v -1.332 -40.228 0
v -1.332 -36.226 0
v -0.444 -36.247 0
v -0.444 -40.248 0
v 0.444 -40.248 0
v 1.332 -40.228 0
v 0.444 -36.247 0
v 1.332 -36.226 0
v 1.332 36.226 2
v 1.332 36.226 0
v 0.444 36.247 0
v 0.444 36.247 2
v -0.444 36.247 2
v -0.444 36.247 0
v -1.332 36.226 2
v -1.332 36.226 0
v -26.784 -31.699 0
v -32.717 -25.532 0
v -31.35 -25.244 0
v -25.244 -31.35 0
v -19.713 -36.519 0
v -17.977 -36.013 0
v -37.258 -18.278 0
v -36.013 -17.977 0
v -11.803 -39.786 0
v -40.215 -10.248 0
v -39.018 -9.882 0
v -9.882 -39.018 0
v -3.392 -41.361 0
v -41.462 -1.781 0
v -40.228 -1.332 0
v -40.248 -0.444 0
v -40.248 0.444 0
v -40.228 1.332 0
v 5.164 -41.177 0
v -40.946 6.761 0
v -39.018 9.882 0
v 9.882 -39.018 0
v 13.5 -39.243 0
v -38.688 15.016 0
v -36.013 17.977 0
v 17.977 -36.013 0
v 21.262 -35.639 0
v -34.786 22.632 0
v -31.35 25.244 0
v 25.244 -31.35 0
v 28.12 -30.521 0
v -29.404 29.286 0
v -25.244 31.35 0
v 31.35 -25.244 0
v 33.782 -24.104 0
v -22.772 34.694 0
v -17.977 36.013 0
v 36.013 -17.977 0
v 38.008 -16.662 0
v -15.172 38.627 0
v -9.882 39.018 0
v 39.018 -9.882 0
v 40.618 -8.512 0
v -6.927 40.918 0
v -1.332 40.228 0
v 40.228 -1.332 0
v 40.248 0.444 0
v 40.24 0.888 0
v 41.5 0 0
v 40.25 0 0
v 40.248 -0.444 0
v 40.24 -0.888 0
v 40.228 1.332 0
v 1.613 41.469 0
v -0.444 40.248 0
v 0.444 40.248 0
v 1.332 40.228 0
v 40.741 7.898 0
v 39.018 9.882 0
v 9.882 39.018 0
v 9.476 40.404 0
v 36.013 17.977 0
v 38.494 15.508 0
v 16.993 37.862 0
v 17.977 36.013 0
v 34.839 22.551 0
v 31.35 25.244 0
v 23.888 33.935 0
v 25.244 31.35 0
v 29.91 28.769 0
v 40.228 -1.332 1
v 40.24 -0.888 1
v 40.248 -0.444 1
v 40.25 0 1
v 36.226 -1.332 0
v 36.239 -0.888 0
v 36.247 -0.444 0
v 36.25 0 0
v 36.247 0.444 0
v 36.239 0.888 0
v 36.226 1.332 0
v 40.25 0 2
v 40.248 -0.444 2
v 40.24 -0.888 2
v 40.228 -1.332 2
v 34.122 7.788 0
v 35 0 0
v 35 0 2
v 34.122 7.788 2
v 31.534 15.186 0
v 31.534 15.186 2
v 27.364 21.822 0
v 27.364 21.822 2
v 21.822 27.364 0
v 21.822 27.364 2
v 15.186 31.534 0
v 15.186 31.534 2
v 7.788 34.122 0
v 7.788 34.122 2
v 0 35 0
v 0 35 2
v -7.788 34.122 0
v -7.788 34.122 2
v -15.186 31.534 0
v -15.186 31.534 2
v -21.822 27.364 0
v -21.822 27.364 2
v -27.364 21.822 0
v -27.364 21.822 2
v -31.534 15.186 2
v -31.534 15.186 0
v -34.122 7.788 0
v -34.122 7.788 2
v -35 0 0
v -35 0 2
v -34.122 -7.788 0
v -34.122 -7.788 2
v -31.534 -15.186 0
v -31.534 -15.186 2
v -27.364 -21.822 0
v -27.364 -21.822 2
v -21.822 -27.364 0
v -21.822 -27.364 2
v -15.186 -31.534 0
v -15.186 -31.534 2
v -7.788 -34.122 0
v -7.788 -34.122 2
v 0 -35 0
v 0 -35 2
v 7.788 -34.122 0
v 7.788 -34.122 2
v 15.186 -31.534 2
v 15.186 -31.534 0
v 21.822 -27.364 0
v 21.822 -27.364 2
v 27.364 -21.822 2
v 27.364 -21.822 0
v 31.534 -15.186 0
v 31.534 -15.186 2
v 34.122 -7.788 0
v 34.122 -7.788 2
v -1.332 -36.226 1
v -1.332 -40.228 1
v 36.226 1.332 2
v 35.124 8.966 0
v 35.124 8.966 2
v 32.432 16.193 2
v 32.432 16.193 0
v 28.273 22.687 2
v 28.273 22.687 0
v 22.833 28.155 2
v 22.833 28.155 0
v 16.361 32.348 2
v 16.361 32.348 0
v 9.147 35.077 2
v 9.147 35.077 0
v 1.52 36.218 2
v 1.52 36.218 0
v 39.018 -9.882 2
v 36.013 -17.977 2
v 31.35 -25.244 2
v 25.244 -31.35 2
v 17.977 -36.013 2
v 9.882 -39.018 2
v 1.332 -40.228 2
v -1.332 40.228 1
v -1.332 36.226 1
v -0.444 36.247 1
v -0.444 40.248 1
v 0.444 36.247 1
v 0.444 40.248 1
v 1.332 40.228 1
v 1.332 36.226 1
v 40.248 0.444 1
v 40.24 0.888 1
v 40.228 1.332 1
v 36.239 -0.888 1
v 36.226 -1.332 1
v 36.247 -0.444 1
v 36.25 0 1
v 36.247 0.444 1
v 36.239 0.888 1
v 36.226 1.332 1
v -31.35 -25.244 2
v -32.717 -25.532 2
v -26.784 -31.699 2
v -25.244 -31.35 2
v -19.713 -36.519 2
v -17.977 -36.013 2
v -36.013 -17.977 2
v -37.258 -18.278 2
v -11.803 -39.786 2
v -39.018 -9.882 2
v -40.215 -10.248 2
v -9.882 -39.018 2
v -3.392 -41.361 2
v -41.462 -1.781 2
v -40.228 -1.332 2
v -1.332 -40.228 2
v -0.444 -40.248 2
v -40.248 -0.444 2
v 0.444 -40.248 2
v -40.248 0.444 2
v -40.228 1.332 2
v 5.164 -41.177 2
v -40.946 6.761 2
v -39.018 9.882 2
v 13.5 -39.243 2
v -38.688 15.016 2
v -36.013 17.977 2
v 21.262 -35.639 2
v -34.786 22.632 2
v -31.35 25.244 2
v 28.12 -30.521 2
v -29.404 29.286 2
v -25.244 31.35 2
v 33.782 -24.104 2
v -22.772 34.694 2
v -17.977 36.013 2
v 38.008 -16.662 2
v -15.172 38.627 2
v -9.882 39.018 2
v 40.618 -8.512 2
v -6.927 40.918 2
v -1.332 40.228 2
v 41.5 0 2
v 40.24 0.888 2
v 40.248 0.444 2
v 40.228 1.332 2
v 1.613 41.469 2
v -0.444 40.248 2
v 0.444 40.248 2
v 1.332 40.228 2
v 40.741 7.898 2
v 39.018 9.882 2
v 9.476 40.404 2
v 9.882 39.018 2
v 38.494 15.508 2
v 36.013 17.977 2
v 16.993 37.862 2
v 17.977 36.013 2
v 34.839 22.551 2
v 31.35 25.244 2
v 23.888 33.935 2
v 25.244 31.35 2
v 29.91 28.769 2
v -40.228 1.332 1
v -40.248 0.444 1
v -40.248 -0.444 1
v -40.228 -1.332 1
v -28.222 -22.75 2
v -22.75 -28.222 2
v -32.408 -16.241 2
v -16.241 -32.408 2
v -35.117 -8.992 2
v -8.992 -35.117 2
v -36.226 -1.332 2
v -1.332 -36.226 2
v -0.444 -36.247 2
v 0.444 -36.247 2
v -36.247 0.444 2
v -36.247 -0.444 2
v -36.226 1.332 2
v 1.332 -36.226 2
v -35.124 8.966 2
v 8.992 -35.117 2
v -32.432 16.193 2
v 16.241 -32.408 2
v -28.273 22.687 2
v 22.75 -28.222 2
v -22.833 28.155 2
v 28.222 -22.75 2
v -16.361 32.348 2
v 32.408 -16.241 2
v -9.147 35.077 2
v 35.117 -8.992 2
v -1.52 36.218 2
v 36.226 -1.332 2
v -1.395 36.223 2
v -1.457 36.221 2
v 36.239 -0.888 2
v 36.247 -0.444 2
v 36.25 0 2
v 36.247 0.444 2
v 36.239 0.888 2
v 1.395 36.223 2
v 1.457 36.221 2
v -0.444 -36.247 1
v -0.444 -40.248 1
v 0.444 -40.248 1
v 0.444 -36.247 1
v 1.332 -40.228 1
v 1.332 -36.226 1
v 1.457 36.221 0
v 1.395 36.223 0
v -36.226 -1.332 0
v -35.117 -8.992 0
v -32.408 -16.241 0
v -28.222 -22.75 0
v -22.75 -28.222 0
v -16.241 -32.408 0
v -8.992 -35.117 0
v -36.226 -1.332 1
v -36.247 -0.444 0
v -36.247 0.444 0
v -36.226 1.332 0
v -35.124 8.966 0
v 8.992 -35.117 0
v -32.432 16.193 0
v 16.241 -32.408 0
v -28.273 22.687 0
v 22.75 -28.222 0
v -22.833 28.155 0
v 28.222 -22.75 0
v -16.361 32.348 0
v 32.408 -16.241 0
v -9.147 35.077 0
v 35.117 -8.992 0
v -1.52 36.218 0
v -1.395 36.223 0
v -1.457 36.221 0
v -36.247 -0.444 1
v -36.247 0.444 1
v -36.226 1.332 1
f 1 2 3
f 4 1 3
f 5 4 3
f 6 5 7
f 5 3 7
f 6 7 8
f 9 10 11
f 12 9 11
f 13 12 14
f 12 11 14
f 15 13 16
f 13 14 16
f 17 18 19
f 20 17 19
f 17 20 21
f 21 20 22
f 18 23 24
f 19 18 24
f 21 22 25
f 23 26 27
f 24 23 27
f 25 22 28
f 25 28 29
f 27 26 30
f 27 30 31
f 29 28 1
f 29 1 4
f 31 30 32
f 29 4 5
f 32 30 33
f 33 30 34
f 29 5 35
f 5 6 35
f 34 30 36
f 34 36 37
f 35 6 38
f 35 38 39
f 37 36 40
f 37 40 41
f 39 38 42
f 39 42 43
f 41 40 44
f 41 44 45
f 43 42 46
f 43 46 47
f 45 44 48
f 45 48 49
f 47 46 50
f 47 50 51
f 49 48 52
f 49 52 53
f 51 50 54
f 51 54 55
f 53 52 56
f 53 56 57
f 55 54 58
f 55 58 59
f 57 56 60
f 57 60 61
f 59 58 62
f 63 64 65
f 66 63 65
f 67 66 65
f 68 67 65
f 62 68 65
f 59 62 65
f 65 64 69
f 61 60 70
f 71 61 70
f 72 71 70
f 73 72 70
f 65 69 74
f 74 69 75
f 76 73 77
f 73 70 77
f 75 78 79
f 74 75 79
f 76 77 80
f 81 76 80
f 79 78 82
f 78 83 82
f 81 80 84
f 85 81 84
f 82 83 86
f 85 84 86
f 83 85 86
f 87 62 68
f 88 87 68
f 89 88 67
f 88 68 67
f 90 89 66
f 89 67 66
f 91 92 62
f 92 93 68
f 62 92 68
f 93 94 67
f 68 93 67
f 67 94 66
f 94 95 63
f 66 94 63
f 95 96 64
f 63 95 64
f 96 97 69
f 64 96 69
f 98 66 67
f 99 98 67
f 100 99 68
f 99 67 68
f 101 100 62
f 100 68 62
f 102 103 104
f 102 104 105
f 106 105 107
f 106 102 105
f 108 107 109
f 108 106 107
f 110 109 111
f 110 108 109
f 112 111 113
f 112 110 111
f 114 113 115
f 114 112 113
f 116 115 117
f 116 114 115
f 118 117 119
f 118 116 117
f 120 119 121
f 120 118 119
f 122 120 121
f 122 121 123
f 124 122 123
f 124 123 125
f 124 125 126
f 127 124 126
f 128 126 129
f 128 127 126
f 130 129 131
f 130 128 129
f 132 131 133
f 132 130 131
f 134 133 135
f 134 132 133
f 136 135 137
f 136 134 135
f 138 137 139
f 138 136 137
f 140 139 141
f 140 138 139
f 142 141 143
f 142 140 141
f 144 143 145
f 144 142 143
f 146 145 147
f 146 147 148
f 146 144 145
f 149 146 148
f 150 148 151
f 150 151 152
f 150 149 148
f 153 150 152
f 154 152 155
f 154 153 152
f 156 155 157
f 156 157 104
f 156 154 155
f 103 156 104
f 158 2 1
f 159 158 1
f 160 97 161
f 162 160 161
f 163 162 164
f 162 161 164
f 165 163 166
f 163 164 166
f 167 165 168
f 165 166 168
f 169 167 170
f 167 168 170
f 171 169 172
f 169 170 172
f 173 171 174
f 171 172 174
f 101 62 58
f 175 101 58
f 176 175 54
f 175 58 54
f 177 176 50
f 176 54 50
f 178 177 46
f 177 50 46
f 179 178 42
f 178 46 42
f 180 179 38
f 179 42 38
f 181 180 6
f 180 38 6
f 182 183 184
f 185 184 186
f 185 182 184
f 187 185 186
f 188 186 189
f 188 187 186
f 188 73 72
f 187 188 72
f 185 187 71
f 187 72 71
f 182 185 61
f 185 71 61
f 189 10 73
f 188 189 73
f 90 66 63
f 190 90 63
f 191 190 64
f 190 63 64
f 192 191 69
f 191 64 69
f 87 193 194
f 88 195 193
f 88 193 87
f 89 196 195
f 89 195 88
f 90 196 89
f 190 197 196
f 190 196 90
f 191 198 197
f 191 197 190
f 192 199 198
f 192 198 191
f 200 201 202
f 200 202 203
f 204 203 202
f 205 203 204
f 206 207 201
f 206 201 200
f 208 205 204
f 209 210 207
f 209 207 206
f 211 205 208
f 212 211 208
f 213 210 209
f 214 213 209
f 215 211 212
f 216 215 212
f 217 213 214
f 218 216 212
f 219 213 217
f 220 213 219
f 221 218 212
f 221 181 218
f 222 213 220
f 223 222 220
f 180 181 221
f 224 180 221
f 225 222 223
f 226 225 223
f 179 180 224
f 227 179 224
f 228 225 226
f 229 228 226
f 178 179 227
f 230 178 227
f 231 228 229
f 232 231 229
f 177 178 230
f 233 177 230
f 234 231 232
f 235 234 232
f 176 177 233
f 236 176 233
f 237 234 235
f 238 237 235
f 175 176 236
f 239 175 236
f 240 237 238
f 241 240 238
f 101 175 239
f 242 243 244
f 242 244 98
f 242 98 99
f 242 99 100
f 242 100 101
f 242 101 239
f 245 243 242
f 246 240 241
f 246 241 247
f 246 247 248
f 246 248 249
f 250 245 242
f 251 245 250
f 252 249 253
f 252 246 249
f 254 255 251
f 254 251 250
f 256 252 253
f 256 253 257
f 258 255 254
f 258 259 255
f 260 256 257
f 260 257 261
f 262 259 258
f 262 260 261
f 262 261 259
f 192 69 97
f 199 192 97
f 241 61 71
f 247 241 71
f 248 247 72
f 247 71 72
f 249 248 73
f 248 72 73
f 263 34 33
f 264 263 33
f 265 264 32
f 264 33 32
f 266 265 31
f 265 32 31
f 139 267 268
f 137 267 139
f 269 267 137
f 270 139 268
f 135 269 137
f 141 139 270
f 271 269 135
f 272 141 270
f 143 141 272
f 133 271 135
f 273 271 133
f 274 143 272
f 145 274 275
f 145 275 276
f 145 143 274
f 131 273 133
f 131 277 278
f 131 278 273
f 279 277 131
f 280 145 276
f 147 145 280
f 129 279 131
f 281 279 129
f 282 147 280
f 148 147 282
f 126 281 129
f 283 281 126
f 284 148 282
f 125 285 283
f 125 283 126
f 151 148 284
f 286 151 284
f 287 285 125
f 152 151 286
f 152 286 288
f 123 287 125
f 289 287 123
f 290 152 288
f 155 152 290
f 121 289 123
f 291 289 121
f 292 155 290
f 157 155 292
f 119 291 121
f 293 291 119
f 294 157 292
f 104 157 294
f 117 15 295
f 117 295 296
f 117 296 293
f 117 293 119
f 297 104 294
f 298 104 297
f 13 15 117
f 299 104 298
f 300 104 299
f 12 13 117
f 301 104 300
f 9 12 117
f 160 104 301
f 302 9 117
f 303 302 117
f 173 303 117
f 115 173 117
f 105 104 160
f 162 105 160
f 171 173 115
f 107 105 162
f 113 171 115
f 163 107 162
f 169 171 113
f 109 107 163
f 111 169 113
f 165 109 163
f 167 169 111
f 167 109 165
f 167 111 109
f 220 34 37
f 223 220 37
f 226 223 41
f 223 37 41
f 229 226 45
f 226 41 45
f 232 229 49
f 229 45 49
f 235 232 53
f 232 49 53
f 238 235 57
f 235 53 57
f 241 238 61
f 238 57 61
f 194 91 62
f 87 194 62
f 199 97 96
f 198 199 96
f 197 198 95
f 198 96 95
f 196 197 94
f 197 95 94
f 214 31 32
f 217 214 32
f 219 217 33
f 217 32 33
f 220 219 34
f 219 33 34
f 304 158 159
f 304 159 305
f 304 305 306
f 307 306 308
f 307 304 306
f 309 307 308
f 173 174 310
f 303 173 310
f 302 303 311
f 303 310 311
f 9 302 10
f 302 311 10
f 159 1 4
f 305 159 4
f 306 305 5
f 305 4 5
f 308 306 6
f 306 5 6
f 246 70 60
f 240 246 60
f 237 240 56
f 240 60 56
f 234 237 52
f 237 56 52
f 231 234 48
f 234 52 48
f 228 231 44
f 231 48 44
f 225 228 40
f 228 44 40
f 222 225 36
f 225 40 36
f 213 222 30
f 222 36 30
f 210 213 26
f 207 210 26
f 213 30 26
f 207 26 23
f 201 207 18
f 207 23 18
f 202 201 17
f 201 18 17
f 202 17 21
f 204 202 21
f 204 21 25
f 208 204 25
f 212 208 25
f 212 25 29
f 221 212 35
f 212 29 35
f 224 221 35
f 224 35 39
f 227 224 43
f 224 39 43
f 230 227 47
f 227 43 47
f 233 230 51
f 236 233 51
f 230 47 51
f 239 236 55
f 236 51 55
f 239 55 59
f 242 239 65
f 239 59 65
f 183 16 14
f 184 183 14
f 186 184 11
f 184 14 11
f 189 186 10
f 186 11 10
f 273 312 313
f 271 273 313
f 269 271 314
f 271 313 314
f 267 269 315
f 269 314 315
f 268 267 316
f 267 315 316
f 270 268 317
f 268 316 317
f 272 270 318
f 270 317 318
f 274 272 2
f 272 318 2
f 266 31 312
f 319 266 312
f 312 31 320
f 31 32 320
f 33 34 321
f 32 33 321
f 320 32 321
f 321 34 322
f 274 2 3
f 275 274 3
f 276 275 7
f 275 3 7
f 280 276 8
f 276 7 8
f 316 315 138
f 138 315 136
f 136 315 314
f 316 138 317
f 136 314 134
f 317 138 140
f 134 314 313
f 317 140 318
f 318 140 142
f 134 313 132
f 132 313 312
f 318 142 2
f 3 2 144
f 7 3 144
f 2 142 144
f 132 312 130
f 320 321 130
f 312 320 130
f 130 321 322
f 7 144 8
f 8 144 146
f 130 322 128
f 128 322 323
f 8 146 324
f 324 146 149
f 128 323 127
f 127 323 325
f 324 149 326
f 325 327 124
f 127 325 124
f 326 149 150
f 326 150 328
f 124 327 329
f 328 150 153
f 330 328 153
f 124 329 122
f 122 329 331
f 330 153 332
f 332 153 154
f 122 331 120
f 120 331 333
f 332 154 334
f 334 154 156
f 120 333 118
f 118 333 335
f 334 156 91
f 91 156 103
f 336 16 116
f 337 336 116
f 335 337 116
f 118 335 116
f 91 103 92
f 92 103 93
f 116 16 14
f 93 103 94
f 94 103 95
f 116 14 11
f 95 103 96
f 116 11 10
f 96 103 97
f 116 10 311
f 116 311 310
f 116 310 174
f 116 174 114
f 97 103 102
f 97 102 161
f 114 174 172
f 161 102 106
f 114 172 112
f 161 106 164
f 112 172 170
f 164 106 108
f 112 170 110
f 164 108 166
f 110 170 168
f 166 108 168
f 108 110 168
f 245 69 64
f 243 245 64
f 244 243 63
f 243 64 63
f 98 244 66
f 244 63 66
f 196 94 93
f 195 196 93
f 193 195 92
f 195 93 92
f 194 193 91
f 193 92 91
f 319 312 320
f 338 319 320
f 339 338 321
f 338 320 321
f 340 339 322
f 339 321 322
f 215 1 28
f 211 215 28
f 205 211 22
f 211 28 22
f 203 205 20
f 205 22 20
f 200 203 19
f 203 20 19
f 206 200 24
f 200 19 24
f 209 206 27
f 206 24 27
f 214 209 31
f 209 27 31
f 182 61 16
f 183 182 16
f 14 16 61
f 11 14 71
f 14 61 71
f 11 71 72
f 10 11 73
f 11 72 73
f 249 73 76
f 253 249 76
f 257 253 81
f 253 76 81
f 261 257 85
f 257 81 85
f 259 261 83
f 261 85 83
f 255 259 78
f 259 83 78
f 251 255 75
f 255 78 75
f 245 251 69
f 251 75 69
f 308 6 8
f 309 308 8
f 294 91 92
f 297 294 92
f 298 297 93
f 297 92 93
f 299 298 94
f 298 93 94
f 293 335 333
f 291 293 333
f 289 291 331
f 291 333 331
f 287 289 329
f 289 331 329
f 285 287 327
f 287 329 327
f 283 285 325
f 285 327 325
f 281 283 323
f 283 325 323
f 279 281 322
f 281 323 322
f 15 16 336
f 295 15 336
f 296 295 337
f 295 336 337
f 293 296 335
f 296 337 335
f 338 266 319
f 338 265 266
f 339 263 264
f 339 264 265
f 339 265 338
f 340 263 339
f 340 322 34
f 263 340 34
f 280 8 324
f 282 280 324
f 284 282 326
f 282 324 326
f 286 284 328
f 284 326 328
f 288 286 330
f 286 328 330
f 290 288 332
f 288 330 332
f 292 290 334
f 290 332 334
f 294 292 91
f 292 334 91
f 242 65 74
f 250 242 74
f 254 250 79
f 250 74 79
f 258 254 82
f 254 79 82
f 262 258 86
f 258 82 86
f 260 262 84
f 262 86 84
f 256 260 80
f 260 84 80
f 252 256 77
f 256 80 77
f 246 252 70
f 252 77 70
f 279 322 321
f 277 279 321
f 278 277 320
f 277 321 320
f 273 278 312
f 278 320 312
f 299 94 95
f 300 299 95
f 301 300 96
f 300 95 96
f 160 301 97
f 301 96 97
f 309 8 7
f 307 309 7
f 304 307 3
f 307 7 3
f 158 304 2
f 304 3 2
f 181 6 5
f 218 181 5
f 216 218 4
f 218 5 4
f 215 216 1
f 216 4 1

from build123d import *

# Parameters (mm, degrees)
F1_DEPTH = 2
F0_R     = 35
F0_W     = 2.6646726765
F0_H     = 1.0178747537
F2_DEPTH = 1


with BuildPart() as f1:
    # F0 (on Top) → F1 (new body)
    with BuildSketch(Plane.XY):
        with BuildLine():
            ThreePointArc((1.6134383026, 41.468624487), (-29.9099288662, -28.7688400048), (41.5, 0))
            ThreePointArc((41.5, 0), (29.9099288662, 28.7688400048), (1.6134383026, 41.468624487))
        make_face()
        with BuildLine():
            ThreePointArc((1.3323363382, 40.2279427747), (28.4610479428, 28.4610479428), (40.2279427747, 1.3323363382))
            Line((40.2279427747, 1.3323363382), (40.8782474697, 1.3323363382))
            Line((40.8782474697, 1.3323363382), (40.8782474697, -1.3323363382))
            Line((40.8782474697, -1.3323363382), (40.2279427747, -1.3323363382))
            ThreePointArc((40.2279427747, -1.3323363382), (28.4610479428, -28.4610479428), (1.3323363382, -40.2279427747))
            Line((1.3323363382, -40.2279427747), (1.3323363382, -40.8782474697))
            Line((1.3323363382, -40.8782474697), (-1.3323363382, -40.8782474697))
            Line((-1.3323363382, -40.8782474697), (-1.3323363382, -40.2279427747))
            ThreePointArc((-1.3323363382, -40.2279427747), (-28.4610479428, -28.4610479428), (-40.2279427747, -1.3323363382))
            Line((-40.2279427747, -1.3323363382), (-40.8782474697, -1.3323363382))
            Line((-40.8782474697, -1.3323363382), (-40.8782474697, 1.3323363382))
            Line((-40.8782474697, 1.3323363382), (-40.2279427747, 1.3323363382))
            ThreePointArc((-40.2279427747, 1.3323363382), (-28.4610479428, 28.4610479428), (-1.3323363382, 40.2279427747))
            Line((-1.3323363382, 40.2279427747), (-1.3323363382, 40.8782474697))
            Line((-1.3323363382, 40.8782474697), (1.3323363382, 40.8782474697))
            Line((1.3323363382, 40.8782474697), (1.3323363382, 40.2279427747))
        make_face(mode=Mode.SUBTRACT)
        with BuildLine():
            ThreePointArc((-40.2279427747, -1.3323363382), (-40.25, 0), (-40.2279427747, 1.3323363382))
            Line((-40.2279427747, 1.3323363382), (-40.8782474697, 1.3323363382))
            Line((-40.8782474697, 1.3323363382), (-40.8782474697, -1.3323363382))
            Line((-40.8782474697, -1.3323363382), (-40.2279427747, -1.3323363382))
        make_face()
        with BuildLine():
            ThreePointArc((-1.3323363382, 40.2279427747), (0, 40.25), (1.3323363382, 40.2279427747))
            Line((1.3323363382, 40.2279427747), (1.3323363382, 40.8782474697))
            Line((1.3323363382, 40.8782474697), (-1.3323363382, 40.8782474697))
            Line((-1.3323363382, 40.8782474697), (-1.3323363382, 40.2279427747))
        make_face()
        with BuildLine():
            Line((1.3323363382, -40.8782474697), (1.3323363382, -40.2279427747))
            ThreePointArc((1.3323363382, -40.2279427747), (0, -40.25), (-1.3323363382, -40.2279427747))
            Line((-1.3323363382, -40.2279427747), (-1.3323363382, -40.8782474697))
            Line((-1.3323363382, -40.8782474697), (1.3323363382, -40.8782474697))
        make_face()
        with BuildLine():
            Line((40.8782474697, 1.3323363382), (40.2279427747, 1.3323363382))
            ThreePointArc((40.2279427747, 1.3323363382), (40.2444853159, 0.6662594538), (40.25, 0))
            ThreePointArc((40.25, 0), (40.2444853159, -0.6662594538), (40.2279427747, -1.3323363382))
            Line((40.2279427747, -1.3323363382), (40.8782474697, -1.3323363382))
            Line((40.8782474697, -1.3323363382), (40.8782474697, 1.3323363382))
        make_face()
    extrude(amount=F1_DEPTH)


with BuildPart() as f1b:
    # F0 (on Top) → F1, piece 2 (new body)
    with BuildSketch(Plane.XY):
        with BuildLine():
            Line((35.2002568543, 1.3323363382), (36.2255073102, 1.3323363382))
            ThreePointArc((36.2255073102, 1.3323363382), (25.6988242062, 25.5662459978), (1.5196851084, 36.218131608))
            Line((1.5196851084, 36.218131608), (1.3323363382, 36.218131608))
            Line((1.3323363382, 36.218131608), (1.3323363382, 35.2002568543))
            Line((1.3323363382, 35.2002568543), (-1.3323363382, 35.2002568543))
            Line((-1.3323363382, 35.2002568543), (-1.3323363382, 36.218131608))
            Line((-1.3323363382, 36.218131608), (-1.5196851084, 36.218131608))
            ThreePointArc((-1.5196851084, 36.218131608), (-25.6988242062, 25.5662459978), (-36.2255073102, 1.3323363382))
            Line((-36.2255073102, 1.3323363382), (-35.2002568543, 1.3323363382))
            Line((-35.2002568543, 1.3323363382), (-35.2002568543, -1.3323363382))
            Line((-35.2002568543, -1.3323363382), (-36.2255073102, -1.3323363382))
            ThreePointArc((-36.2255073102, -1.3323363382), (-25.632620818, -25.632620818), (-1.3323363382, -36.2255073102))
            Line((-1.3323363382, -36.2255073102), (-1.3323363382, -35.2002568543))
            Line((-1.3323363382, -35.2002568543), (1.3323363382, -35.2002568543))
            Line((1.3323363382, -35.2002568543), (1.3323363382, -36.2255073102))
            ThreePointArc((1.3323363382, -36.2255073102), (25.632620818, -25.632620818), (36.2255073102, -1.3323363382))
            Line((36.2255073102, -1.3323363382), (35.2002568543, -1.3323363382))
            Line((35.2002568543, -1.3323363382), (35.2002568543, 1.3323363382))
        make_face()
        Circle(F0_R, mode=Mode.SUBTRACT)
        with BuildLine():
            ThreePointArc((36.2255073102, -1.3323363382), (36.2438763103, -0.6662807235), (36.25, 0))
            ThreePointArc((36.25, 0), (36.2438763103, 0.6662807235), (36.2255073102, 1.3323363382))
            Line((36.2255073102, 1.3323363382), (35.2002568543, 1.3323363382))
            Line((35.2002568543, 1.3323363382), (35.2002568543, -1.3323363382))
            Line((35.2002568543, -1.3323363382), (36.2255073102, -1.3323363382))
        make_face()
        with BuildLine():
            ThreePointArc((-36.2255073102, 1.3323363382), (-36.25, 0), (-36.2255073102, -1.3323363382))
            Line((-36.2255073102, -1.3323363382), (-35.2002568543, -1.3323363382))
            Line((-35.2002568543, -1.3323363382), (-35.2002568543, 1.3323363382))
            Line((-35.2002568543, 1.3323363382), (-36.2255073102, 1.3323363382))
        make_face()
        with BuildLine():
            ThreePointArc((-1.3323363382, -36.2255073102), (0, -36.25), (1.3323363382, -36.2255073102))
            Line((1.3323363382, -36.2255073102), (1.3323363382, -35.2002568543))
            Line((1.3323363382, -35.2002568543), (-1.3323363382, -35.2002568543))
            Line((-1.3323363382, -35.2002568543), (-1.3323363382, -36.2255073102))
        make_face()
        with Locations((0, 35.7091942311)):
            Rectangle(F0_W, F0_H)
        with BuildLine():
            Line((1.3323363382, 36.218131608), (1.3323363382, 36.2255073102))
            ThreePointArc((1.3323363382, 36.2255073102), (0, 36.25), (-1.3323363382, 36.2255073102))
            Line((-1.3323363382, 36.2255073102), (-1.3323363382, 36.218131608))
            Line((-1.3323363382, 36.218131608), (1.3323363382, 36.218131608))
        make_face()
        with BuildLine():
            Line((-1.3323363382, 36.218131608), (-1.3323363382, 36.2255073102))
            ThreePointArc((-1.3323363382, 36.2255073102), (-1.426015492, 36.221940586), (-1.5196851084, 36.218131608))
            Line((-1.5196851084, 36.218131608), (-1.3323363382, 36.218131608))
        make_face()
        with BuildLine():
            Line((1.3323363382, 36.218131608), (1.5196851084, 36.218131608))
            ThreePointArc((1.5196851084, 36.218131608), (1.426015492, 36.221940586), (1.3323363382, 36.2255073102))
            Line((1.3323363382, 36.2255073102), (1.3323363382, 36.218131608))
        make_face()
    extrude(amount=F1_DEPTH)


with BuildPart() as f2:
    # F0 (on Top) → F2 (new body)
    with BuildSketch(Plane.XY):
        with BuildLine():
            ThreePointArc((-1.3323363382, 36.2255073102), (0, 36.25), (1.3323363382, 36.2255073102))
            Line((1.3323363382, 36.2255073102), (1.3323363382, 40.2279427747))
            ThreePointArc((1.3323363382, 40.2279427747), (0, 40.25), (-1.3323363382, 40.2279427747))
            Line((-1.3323363382, 40.2279427747), (-1.3323363382, 36.2255073102))
        make_face()
    extrude(amount=F2_DEPTH)


with BuildPart() as f2b:
    # F0 (on Top) → F2, piece 2 (new body)
    with BuildSketch(Plane.XY):
        with BuildLine():
            ThreePointArc((36.2255073102, 1.3323363382), (36.2438763103, 0.6662807235), (36.25, 0))
            ThreePointArc((36.25, 0), (36.2438763103, -0.6662807235), (36.2255073102, -1.3323363382))
            Line((36.2255073102, -1.3323363382), (40.2279427747, -1.3323363382))
            ThreePointArc((40.2279427747, -1.3323363382), (40.2444853159, -0.6662594538), (40.25, 0))
            ThreePointArc((40.25, 0), (40.2444853159, 0.6662594538), (40.2279427747, 1.3323363382))
            Line((40.2279427747, 1.3323363382), (36.2255073102, 1.3323363382))
        make_face()
    extrude(amount=F2_DEPTH)


with BuildPart() as f2c:
    # F0 (on Top) → F2, piece 3 (new body)
    with BuildSketch(Plane.XY):
        with BuildLine():
            Line((1.3323363382, -40.2279427747), (1.3323363382, -36.2255073102))
            ThreePointArc((1.3323363382, -36.2255073102), (0, -36.25), (-1.3323363382, -36.2255073102))
            Line((-1.3323363382, -36.2255073102), (-1.3323363382, -40.2279427747))
            ThreePointArc((-1.3323363382, -40.2279427747), (0, -40.25), (1.3323363382, -40.2279427747))
        make_face()
    extrude(amount=F2_DEPTH)


with BuildPart() as f2d:
    # F0 (on Top) → F2, piece 4 (new body)
    with BuildSketch(Plane.XY):
        with BuildLine():
            Line((-40.2279427747, -1.3323363382), (-36.2255073102, -1.3323363382))
            ThreePointArc((-36.2255073102, -1.3323363382), (-36.25, 0), (-36.2255073102, 1.3323363382))
            Line((-36.2255073102, 1.3323363382), (-40.2279427747, 1.3323363382))
            ThreePointArc((-40.2279427747, 1.3323363382), (-40.25, 0), (-40.2279427747, -1.3323363382))
        make_face()
    extrude(amount=F2_DEPTH)


solid = Compound([f1.part, f1b.part, f2.part, f2b.part, f2c.part, f2d.part])
